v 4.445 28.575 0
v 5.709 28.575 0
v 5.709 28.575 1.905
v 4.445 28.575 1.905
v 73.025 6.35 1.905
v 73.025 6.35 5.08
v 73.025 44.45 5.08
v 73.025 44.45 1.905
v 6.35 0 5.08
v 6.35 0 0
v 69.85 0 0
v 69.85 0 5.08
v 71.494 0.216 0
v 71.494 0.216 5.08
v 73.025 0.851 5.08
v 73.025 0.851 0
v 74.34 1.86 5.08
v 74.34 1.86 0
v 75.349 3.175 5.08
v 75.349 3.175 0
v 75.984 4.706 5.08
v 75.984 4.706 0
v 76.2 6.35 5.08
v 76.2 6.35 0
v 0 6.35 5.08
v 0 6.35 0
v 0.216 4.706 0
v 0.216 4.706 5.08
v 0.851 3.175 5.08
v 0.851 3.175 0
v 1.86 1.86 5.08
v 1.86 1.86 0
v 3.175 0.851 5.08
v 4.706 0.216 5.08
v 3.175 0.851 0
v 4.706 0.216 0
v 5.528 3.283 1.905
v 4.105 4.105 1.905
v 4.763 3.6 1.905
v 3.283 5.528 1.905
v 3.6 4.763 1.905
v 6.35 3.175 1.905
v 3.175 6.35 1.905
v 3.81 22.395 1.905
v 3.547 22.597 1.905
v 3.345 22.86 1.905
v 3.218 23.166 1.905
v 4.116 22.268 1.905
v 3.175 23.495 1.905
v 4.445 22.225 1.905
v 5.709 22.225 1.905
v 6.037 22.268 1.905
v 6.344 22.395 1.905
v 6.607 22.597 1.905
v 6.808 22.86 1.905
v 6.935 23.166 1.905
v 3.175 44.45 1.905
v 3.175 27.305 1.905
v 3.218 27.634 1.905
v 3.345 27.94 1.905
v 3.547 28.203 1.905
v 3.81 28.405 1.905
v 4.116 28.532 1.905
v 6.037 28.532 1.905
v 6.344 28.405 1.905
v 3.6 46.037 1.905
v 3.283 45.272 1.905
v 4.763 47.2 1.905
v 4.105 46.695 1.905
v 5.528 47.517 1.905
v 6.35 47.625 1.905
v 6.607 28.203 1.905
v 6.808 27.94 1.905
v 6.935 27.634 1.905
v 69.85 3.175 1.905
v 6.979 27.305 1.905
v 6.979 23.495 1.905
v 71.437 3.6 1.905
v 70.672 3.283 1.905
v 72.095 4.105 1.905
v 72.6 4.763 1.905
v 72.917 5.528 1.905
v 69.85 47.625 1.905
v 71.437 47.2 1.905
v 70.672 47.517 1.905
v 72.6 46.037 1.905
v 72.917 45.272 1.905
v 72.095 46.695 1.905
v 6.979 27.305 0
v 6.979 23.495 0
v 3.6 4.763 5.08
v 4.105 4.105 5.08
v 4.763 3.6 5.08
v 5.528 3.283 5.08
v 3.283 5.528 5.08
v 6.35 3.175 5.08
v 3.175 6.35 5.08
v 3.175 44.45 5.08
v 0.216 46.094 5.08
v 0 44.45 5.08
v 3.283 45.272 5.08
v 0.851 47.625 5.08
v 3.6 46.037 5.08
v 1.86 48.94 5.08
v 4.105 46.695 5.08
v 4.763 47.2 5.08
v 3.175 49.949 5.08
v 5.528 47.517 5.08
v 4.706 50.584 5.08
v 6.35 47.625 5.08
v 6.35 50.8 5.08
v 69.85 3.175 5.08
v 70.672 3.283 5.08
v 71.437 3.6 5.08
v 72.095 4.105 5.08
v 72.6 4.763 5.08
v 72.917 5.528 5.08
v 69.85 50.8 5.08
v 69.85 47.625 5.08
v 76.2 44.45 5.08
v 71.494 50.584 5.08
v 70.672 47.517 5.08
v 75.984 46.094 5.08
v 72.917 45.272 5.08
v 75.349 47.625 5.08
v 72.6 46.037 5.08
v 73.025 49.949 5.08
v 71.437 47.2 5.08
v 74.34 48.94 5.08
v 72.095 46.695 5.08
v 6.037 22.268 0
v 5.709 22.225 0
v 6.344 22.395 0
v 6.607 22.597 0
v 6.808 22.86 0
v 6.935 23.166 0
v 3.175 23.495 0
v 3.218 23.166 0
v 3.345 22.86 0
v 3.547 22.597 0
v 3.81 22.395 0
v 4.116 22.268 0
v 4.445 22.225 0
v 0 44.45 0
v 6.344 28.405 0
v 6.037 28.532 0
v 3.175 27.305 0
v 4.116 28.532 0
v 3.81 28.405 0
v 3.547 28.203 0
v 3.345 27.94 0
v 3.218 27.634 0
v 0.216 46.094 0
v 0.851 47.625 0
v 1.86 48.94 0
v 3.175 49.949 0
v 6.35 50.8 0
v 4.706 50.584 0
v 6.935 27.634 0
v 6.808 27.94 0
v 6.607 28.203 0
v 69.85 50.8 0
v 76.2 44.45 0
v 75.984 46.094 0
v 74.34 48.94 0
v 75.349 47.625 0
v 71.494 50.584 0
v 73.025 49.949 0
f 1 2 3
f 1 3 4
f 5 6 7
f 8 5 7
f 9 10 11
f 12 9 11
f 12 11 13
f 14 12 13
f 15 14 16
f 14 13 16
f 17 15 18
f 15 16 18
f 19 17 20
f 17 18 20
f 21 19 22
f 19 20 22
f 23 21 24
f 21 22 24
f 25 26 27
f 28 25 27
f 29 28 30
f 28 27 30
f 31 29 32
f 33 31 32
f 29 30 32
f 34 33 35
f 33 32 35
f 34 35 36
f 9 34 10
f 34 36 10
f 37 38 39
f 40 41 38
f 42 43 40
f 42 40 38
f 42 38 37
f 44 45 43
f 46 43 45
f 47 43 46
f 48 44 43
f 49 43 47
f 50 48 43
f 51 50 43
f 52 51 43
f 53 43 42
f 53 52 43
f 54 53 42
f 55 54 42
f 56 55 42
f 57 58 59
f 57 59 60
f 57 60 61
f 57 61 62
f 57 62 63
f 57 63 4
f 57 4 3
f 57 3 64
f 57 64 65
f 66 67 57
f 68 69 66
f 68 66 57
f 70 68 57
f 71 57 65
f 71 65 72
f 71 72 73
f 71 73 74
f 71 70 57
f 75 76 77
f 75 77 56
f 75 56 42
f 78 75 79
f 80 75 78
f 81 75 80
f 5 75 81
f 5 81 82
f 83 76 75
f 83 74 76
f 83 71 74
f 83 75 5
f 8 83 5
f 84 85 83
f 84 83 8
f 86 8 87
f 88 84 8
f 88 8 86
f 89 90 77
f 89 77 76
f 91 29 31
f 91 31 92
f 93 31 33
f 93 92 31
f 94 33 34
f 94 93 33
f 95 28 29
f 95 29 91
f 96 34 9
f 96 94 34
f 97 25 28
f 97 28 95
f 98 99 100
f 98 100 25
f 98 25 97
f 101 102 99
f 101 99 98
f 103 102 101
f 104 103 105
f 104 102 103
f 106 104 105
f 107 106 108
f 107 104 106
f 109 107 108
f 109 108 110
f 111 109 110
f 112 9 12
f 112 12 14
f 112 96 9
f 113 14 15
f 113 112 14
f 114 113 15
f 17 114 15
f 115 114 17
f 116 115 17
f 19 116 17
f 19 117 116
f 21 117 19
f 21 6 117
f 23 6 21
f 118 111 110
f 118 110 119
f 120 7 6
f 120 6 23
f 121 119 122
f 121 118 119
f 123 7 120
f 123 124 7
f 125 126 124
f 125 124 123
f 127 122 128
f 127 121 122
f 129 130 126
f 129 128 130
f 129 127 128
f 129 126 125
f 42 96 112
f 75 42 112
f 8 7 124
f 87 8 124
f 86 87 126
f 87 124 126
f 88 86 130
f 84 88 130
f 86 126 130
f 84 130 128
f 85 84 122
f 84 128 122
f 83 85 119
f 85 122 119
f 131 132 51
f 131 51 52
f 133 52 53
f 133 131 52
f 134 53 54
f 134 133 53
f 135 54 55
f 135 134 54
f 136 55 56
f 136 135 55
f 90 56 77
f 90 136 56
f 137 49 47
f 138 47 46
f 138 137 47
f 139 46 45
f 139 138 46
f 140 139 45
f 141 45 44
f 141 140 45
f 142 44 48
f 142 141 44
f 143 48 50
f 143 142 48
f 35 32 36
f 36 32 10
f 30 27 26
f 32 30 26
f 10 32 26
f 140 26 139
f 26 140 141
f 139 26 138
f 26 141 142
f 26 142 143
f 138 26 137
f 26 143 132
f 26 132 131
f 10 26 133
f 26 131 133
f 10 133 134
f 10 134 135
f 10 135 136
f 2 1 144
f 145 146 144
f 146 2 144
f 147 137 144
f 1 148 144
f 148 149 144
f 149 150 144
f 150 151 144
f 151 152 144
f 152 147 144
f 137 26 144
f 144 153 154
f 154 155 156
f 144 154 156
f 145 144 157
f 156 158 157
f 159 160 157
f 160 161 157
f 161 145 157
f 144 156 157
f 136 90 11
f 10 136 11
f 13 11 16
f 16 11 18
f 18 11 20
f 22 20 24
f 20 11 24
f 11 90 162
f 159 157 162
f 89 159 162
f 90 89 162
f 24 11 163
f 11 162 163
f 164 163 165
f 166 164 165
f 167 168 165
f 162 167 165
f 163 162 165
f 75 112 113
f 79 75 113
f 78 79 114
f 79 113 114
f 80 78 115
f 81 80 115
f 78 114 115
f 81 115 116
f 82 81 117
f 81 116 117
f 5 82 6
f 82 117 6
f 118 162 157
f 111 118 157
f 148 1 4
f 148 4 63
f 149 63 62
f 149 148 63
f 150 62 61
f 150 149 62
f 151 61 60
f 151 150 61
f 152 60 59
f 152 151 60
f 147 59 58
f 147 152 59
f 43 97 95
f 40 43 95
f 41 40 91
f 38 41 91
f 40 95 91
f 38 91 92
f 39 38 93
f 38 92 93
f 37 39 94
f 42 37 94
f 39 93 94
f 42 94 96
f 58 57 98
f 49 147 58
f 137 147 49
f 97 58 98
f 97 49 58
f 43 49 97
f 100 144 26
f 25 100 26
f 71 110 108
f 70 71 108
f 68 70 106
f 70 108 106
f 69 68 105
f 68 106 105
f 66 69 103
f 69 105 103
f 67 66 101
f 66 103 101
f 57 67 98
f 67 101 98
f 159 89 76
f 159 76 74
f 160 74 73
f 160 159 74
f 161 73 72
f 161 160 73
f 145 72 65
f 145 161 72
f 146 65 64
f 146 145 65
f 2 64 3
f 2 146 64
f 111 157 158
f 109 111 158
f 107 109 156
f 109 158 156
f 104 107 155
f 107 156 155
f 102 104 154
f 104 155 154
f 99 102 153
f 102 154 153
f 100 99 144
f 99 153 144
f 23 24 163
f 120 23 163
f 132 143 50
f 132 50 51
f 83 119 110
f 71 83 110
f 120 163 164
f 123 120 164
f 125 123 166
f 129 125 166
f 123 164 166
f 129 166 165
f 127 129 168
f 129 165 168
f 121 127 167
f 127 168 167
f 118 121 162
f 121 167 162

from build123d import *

# Parameters (mm, degrees)
F1_DEPTH = 5.08
F3_DEPTH = 3.175
F5_DEPTH = 25.4


with BuildPart() as f1:
    # F0 (on Top) → F1 (new body)
    with BuildSketch(Plane.XY):
        with BuildLine():
            ThreePointArc((0, 6.35), (1.859872, 1.859872), (6.35, 0))
            Line((6.35, 0), (69.85, 0))
            ThreePointArc((69.85, 0), (74.340128, 1.859872), (76.2, 6.35))
            Line((76.2, 6.35), (76.2, 44.45))
            ThreePointArc((76.2, 44.45), (74.340128, 48.940128), (69.85, 50.8))
            Line((69.85, 50.8), (6.35, 50.8))
            ThreePointArc((6.35, 50.8), (1.859872, 48.940128), (0, 44.45))
            Line((0, 44.45), (0, 6.35))
        make_face()
    extrude(amount=F1_DEPTH)

    # F2 (on face) → F3 (cut)
    with BuildSketch(Plane.XY.offset(5.08)):
        with BuildLine():
            Line((69.85, 47.625), (6.35, 47.625))
            ThreePointArc((6.35, 47.625), (4.104936, 46.695064), (3.175, 44.45))
            Line((3.175, 44.45), (3.175, 6.35))
            ThreePointArc((3.175, 6.35), (4.104936, 4.104936), (6.35, 3.175))
            Line((6.35, 3.175), (69.85, 3.175))
            ThreePointArc((69.85, 3.175), (72.095064, 4.104936), (73.025, 6.35))
            Line((73.025, 6.35), (73.025, 44.45))
            ThreePointArc((73.025, 44.45), (72.095064, 46.695064), (69.85, 47.625))
        make_face()
    extrude(amount=-F3_DEPTH, mode=Mode.SUBTRACT)

    # F4 (on Top) → F5 (cut)
    with BuildSketch(Plane.XY):
        with BuildLine():
            Line((5.708611, 28.575), (4.445, 28.575))
            ThreePointArc((4.445, 28.575), (3.546974, 28.203026), (3.175, 27.305))
            Line((3.175, 27.305), (3.175, 23.495))
            ThreePointArc((3.175, 23.495), (3.546974, 22.596974), (4.445, 22.225))
            Line((4.445, 22.225), (5.708611, 22.225))
            ThreePointArc((5.708611, 22.225), (6.606637, 22.596974), (6.978611, 23.495))
            Line((6.978611, 23.495), (6.978611, 27.305))
            ThreePointArc((6.978611, 27.305), (6.606637, 28.203026), (5.708611, 28.575))
        make_face()
    extrude(amount=F5_DEPTH, mode=Mode.SUBTRACT)


solid = f1.part
